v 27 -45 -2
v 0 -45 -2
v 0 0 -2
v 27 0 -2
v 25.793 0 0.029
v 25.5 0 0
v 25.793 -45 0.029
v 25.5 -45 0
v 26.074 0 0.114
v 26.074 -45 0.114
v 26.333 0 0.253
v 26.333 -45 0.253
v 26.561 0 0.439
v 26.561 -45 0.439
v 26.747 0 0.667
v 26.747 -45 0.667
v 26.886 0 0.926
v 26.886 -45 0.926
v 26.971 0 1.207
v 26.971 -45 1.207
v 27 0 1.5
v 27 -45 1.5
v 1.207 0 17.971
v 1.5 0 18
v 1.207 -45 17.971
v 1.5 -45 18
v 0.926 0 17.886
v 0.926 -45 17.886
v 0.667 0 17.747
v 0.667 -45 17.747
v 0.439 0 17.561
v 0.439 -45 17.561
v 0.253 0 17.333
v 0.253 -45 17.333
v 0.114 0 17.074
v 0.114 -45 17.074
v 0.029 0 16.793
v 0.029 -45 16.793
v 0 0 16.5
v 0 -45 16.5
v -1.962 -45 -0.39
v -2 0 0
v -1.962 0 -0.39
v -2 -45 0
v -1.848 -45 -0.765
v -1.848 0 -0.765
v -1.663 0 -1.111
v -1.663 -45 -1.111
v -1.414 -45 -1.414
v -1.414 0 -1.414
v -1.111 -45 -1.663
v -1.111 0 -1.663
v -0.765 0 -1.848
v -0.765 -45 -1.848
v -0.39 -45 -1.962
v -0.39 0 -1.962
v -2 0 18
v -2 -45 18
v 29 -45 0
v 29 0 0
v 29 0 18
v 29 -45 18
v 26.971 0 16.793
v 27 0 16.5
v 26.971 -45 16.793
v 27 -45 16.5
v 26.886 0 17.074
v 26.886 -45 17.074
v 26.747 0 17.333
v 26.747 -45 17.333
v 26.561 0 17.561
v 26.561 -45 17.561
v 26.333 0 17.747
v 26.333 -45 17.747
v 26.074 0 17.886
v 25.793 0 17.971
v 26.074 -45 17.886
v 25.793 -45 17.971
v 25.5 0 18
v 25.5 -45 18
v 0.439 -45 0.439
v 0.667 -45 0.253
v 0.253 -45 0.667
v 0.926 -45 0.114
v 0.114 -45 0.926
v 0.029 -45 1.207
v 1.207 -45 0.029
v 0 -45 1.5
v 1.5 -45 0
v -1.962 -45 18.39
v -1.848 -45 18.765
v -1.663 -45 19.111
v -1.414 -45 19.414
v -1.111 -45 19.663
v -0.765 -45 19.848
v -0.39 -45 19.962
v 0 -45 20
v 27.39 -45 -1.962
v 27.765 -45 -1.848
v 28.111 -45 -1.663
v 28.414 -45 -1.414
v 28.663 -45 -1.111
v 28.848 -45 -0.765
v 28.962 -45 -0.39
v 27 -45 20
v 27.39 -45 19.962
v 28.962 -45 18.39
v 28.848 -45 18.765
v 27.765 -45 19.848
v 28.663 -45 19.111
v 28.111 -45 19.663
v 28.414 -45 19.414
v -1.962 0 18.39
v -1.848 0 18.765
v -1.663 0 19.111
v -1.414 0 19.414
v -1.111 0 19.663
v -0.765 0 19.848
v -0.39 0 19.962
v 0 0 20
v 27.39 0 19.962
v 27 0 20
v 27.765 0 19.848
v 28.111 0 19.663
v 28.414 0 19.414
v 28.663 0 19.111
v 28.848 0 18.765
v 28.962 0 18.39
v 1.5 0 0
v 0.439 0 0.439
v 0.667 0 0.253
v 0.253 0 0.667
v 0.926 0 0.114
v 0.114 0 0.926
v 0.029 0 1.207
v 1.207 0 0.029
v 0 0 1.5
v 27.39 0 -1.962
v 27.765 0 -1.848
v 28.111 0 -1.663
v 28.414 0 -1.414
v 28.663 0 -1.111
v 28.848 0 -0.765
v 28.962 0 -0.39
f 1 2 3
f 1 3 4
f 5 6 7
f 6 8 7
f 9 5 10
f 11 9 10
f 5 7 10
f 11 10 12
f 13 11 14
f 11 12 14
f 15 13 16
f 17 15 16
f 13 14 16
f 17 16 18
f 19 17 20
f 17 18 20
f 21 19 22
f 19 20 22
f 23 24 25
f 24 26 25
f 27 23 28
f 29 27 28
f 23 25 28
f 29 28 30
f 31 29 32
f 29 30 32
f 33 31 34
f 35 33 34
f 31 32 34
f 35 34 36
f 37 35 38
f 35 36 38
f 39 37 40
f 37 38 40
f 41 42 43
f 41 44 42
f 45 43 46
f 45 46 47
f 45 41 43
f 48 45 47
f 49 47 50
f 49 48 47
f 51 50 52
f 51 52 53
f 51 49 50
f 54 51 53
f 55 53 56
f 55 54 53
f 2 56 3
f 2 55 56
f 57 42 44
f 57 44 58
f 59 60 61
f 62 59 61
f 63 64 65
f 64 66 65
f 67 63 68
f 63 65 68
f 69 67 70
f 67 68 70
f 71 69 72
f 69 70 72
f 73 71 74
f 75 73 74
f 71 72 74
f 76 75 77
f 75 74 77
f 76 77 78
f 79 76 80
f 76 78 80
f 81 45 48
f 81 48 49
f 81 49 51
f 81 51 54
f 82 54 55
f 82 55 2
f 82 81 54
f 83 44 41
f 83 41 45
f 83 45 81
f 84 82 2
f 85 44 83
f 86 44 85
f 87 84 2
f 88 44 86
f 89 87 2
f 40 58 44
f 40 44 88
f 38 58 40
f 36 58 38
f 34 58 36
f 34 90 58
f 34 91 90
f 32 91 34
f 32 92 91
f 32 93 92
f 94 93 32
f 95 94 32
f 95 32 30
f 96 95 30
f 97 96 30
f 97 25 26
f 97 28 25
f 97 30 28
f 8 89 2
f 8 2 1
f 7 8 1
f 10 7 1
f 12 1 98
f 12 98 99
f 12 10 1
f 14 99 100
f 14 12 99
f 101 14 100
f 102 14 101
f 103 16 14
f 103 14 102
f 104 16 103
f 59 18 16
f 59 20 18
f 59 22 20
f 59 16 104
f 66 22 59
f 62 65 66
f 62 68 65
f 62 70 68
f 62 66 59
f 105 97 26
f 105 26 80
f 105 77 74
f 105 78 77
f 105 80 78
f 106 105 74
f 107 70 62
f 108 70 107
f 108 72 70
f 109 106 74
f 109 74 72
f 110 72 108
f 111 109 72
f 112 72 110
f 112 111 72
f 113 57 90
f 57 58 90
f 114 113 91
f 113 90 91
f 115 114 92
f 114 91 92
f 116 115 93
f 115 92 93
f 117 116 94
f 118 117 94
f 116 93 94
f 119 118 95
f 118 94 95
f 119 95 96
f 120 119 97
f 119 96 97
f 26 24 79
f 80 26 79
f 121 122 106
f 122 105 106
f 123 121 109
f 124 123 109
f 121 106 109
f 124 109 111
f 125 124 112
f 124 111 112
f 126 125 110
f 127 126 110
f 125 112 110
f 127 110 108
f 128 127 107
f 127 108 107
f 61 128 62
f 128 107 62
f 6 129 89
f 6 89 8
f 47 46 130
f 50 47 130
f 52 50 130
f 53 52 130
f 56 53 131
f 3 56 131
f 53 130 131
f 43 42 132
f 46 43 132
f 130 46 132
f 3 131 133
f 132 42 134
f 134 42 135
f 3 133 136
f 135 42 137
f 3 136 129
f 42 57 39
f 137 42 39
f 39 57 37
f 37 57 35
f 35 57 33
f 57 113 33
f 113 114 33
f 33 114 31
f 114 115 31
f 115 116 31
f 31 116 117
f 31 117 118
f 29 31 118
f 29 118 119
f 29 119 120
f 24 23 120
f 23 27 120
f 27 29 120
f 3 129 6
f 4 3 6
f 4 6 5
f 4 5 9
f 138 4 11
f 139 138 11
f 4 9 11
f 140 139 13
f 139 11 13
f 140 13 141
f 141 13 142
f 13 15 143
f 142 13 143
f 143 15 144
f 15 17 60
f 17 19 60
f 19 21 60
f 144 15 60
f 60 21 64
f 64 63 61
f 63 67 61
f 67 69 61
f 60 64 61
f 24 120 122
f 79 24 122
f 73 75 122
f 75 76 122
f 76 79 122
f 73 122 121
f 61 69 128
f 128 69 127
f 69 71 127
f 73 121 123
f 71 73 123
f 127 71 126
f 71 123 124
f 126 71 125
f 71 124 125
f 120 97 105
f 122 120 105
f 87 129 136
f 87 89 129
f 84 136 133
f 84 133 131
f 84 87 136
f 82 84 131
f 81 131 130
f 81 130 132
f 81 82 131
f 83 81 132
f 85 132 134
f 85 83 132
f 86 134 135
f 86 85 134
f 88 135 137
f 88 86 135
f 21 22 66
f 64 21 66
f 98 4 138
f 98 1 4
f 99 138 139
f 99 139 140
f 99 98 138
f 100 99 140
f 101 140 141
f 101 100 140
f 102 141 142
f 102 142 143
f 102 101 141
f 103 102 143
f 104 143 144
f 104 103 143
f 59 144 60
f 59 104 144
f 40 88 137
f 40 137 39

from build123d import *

# Parameters (mm, degrees)
F0_W     = 31
F0_H     = 22
F0_W_2   = 27
F0_H_2   = 18
F1_DEPTH = 45
F2_R     = 2
F3_R     = 1.5


with BuildPart() as f1:
    # F0 (on Front) → F1 (new body)
    with BuildSketch(Plane.XZ):
        with Locations((13.5, 9)):
            Rectangle(F0_W, F0_H)
        with Locations((13.5, 9)):
            Rectangle(F0_W_2, F0_H_2, mode=Mode.SUBTRACT)
    extrude(amount=F1_DEPTH)

    # F2
    f2_edges = [f1.edges().sort_by_distance(p)[0] for p in [
        (29, -22.5, 20),
        (-2, -22.5, 20),
        (29, -22.5, -2),
        (-2, -22.5, -2),
    ]]
    fillet(f2_edges, radius=F2_R)

    # F3
    f3_edges = [f1.edges().sort_by_distance(p)[0] for p in [
        (27, -22.5, 18),
        (27, -22.5, 0),
        (0, -22.5, 0),
        (0, -22.5, 18),
    ]]
    fillet(f3_edges, radius=F3_R)


solid = f1.part
